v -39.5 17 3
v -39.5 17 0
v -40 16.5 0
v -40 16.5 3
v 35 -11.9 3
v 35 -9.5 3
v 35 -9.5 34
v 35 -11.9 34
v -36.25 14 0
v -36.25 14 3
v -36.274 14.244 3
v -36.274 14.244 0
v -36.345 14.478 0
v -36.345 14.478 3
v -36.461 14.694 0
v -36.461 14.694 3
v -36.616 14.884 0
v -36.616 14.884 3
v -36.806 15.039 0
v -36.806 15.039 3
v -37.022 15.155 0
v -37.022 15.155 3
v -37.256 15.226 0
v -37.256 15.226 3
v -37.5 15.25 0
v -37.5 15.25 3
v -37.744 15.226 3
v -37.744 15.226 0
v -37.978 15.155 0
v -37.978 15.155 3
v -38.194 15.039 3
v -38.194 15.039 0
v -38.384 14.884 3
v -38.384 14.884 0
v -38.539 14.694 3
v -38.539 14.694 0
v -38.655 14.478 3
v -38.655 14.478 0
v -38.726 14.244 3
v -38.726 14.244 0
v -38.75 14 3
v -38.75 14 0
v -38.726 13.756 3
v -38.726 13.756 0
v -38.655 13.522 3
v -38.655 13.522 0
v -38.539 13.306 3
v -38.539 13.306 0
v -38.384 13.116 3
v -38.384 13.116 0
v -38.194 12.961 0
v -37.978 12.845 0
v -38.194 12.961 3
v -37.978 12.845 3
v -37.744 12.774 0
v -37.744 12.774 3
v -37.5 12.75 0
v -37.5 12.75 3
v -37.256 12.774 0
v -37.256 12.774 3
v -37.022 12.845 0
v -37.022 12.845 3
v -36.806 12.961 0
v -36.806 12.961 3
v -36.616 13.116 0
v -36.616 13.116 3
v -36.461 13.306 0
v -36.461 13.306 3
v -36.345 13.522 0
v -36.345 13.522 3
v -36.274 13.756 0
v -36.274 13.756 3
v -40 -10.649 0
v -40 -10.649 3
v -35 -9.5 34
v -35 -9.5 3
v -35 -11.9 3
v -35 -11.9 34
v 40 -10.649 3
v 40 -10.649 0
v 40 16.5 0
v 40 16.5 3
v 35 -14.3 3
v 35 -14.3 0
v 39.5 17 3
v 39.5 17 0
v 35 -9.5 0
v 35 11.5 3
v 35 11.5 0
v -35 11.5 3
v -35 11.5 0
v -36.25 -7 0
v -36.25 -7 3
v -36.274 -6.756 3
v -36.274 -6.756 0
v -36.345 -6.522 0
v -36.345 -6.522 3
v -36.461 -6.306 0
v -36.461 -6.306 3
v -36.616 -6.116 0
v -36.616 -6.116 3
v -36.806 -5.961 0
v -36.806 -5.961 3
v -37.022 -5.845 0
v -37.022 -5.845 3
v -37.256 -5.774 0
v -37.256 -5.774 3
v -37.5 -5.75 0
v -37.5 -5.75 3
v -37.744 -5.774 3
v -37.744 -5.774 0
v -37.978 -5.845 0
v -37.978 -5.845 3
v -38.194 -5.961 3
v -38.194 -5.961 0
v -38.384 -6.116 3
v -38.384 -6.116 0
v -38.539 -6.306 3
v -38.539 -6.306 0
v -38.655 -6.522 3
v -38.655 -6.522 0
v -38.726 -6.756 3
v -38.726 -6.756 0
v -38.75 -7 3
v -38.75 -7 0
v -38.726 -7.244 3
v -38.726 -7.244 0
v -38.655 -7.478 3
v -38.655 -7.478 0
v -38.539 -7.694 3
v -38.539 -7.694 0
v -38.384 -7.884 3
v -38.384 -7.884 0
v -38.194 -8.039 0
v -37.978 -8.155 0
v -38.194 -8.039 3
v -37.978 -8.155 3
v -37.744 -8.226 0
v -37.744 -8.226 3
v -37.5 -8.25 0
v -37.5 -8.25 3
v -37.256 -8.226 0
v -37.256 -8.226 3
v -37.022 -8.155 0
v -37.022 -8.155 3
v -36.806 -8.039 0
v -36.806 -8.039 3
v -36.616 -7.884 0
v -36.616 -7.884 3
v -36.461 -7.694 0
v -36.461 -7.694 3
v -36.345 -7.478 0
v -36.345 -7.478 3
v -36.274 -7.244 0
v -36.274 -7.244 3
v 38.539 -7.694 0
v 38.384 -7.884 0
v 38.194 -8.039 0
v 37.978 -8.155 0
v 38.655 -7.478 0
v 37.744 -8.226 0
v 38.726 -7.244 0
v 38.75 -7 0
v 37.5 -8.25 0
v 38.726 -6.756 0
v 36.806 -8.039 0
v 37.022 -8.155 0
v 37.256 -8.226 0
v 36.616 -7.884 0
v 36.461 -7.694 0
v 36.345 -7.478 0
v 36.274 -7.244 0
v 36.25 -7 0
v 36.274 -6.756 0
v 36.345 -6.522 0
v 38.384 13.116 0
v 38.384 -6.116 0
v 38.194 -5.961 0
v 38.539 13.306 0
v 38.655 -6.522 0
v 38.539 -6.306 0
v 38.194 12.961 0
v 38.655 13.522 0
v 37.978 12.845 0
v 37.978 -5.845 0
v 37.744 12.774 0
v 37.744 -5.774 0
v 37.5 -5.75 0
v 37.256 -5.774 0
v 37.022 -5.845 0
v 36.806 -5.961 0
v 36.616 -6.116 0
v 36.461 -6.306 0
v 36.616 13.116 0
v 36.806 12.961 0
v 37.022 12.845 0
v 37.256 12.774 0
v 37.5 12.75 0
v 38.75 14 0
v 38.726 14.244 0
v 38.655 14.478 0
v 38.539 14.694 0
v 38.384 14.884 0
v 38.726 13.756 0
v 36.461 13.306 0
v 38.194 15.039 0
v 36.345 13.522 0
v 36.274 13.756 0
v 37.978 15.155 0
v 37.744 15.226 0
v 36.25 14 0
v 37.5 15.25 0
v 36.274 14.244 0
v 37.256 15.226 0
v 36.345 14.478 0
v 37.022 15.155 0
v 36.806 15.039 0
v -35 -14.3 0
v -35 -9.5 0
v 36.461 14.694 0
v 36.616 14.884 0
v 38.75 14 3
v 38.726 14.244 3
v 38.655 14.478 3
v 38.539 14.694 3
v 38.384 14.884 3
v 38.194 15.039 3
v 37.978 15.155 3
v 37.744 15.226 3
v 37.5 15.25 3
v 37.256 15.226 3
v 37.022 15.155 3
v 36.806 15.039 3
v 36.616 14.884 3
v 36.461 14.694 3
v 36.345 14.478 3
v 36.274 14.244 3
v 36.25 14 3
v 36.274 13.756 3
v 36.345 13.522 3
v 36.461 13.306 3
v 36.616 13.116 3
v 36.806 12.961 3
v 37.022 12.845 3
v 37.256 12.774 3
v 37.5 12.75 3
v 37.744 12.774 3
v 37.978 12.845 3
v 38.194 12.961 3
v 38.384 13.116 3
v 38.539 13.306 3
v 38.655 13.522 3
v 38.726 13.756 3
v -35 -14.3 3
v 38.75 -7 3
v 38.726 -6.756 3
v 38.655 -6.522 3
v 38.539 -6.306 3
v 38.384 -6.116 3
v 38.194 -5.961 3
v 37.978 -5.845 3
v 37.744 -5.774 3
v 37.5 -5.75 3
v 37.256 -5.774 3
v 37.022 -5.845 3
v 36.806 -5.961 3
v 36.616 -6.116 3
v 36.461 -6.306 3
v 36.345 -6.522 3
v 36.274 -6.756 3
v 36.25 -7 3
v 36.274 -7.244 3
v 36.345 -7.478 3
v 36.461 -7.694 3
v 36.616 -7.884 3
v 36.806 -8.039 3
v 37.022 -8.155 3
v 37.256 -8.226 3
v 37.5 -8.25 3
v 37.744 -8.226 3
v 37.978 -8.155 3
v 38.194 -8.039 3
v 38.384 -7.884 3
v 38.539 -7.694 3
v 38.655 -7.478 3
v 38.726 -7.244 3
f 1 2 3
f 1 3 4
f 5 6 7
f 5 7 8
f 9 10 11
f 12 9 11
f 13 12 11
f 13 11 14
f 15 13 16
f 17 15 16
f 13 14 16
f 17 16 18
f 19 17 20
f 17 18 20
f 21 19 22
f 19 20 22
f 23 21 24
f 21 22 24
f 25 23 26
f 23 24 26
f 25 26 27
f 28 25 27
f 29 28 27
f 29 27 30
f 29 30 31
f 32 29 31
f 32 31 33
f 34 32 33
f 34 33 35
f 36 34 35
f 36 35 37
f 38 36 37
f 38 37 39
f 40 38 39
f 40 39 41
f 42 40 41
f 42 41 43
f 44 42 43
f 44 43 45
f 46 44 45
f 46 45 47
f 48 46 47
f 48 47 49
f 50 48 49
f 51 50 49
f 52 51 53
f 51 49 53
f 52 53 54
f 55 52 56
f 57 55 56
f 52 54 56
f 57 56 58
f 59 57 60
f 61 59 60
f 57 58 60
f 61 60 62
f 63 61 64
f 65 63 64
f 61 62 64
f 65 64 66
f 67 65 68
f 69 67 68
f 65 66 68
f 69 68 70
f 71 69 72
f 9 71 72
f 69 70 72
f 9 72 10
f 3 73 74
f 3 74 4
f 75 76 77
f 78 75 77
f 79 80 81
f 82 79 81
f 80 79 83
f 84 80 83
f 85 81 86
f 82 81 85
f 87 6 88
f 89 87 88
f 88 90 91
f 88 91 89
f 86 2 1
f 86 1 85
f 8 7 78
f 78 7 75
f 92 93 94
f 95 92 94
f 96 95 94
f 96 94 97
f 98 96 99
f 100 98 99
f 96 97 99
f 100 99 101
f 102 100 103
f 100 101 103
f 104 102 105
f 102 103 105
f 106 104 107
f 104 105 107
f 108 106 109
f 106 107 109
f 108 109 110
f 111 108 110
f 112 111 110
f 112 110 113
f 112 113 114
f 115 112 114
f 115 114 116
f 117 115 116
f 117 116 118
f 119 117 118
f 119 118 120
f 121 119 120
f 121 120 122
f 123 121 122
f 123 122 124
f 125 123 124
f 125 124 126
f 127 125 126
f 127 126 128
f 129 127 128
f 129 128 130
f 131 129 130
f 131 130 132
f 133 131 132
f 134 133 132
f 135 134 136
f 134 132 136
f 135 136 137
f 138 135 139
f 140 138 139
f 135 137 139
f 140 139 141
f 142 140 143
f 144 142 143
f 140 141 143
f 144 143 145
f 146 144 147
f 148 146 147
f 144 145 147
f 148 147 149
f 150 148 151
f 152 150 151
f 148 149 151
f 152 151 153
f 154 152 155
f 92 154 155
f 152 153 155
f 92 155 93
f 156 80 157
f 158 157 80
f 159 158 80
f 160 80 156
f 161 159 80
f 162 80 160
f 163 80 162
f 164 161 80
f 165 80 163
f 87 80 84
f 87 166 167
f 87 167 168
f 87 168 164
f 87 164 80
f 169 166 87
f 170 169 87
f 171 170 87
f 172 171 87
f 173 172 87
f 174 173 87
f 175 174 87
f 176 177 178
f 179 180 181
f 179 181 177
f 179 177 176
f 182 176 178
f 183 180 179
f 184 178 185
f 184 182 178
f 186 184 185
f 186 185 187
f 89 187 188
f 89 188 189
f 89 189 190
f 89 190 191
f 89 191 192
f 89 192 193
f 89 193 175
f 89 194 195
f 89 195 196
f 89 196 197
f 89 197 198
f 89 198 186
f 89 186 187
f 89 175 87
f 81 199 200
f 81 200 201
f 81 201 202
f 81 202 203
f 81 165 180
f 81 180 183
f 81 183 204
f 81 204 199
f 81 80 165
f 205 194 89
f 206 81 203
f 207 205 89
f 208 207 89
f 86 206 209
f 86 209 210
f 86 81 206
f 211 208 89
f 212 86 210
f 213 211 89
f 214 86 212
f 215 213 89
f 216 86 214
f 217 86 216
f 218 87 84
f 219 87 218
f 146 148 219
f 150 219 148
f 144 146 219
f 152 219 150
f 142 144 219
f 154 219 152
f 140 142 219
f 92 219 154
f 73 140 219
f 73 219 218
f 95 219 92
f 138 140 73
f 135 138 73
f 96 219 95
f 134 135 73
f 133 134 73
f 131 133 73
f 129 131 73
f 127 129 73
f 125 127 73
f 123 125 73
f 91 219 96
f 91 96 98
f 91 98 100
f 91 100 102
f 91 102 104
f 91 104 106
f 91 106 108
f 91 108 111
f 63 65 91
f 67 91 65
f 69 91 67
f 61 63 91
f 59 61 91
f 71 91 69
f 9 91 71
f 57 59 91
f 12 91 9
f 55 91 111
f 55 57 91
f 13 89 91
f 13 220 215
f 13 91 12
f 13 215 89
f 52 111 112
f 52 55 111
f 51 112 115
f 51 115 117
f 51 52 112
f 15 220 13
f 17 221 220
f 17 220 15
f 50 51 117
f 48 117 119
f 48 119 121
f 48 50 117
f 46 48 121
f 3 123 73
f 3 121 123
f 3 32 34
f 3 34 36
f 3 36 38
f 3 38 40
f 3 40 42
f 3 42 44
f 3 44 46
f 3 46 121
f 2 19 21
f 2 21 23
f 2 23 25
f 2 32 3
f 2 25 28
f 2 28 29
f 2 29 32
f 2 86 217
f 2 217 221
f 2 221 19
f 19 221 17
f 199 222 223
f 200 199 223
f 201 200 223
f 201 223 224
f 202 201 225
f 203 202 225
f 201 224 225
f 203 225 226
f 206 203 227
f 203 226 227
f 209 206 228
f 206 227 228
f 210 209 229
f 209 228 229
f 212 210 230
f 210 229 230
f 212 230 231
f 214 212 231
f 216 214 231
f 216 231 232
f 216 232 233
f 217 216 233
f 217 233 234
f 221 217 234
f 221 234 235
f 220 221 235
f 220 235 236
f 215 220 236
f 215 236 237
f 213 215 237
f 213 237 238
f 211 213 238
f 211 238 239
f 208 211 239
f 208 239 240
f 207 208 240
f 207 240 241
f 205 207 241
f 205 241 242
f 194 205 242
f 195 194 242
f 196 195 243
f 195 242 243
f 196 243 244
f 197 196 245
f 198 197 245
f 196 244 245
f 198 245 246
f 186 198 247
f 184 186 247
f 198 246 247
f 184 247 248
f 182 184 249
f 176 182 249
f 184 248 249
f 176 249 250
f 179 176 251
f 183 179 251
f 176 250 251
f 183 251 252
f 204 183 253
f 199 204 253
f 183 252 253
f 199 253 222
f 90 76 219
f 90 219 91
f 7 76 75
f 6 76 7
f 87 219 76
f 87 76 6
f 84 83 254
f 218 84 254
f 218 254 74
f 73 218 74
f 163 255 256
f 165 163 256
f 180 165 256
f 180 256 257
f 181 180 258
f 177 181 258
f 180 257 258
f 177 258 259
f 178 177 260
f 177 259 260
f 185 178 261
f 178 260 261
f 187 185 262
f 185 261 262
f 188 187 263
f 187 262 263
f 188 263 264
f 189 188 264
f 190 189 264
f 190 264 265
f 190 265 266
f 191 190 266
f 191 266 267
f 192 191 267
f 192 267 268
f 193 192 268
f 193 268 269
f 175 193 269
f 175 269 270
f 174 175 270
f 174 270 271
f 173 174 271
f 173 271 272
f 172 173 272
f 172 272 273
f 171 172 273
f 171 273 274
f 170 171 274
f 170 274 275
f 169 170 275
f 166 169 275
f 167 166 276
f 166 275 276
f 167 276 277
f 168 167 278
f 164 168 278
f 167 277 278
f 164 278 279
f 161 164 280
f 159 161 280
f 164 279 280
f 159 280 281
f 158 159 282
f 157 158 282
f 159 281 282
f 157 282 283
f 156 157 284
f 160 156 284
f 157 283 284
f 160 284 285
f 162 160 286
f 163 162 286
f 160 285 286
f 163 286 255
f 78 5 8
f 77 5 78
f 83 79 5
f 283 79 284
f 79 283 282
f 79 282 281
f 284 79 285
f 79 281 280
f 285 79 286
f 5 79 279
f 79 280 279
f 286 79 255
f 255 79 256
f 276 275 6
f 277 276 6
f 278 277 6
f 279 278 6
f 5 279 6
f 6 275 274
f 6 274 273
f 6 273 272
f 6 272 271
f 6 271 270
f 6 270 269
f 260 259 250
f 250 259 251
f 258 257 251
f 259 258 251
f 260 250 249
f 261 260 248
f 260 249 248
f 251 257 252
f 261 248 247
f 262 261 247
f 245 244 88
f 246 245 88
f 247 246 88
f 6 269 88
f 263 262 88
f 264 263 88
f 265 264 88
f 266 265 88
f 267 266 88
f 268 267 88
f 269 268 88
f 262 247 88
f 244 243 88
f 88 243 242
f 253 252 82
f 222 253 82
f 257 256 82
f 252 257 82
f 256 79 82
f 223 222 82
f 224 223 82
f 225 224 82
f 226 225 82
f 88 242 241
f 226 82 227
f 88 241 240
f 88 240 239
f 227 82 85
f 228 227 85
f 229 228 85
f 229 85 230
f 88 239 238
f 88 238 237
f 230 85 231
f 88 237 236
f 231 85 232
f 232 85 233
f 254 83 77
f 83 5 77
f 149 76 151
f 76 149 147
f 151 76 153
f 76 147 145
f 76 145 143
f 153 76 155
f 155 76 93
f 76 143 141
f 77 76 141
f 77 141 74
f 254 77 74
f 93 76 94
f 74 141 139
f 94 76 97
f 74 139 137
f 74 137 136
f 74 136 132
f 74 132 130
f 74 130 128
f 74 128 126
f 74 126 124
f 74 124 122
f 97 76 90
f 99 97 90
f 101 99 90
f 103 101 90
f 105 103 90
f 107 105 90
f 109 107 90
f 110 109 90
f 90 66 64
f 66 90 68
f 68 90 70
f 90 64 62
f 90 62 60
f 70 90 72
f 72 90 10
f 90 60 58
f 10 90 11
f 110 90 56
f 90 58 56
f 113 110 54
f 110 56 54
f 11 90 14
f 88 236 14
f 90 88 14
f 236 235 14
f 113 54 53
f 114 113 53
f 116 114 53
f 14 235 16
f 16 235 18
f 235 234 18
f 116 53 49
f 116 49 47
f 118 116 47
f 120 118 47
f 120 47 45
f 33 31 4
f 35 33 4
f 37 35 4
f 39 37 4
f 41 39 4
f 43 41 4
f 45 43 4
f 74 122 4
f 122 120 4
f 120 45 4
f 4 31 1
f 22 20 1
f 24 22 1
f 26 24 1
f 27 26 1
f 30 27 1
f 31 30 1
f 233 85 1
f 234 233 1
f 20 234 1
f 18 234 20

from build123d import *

# Parameters (mm, degrees)
SKETCH_1_W              = 80
SKETCH_1_H              = 34
EXTRUDE_1_DEPTH         = 3
SKETCH_2_W              = 70
SKETCH_2_H              = 23
CUT_EXTRUDE_2_DEPTH     = 3
CHAMFER_1_SIZE          = 0.5
SKETCH_7_W              = 25
SKETCH_7_H              = 3
CUT_EXTRUDE_6_DEPTH     = 3
FILLET_2_R              = 2
CHAMFER_2_SIZE          = 11
CHAMFER_2_SIZE2         = 6.350852961
CHAMFER_3_SIZE          = 11
CHAMFER_3_SIZE2         = 6.350852961
FILLET_3_R              = 2
HOLE_WIZARD_2_5_2_5_1_D = 2.5
SKETCH_11_W             = 69
SKETCH_11_H             = 10.181057749
CUT_EXTRUDE_1_DEPTH     = 10
EXTRUDE_2_DEPTH         = 3
EXTRUDE_4_DEPTH         = 3
EXTRUDE_5_DEPTH         = 31


with BuildPart() as part:
    # 草图1 → Extrude 1 (new body)
    with BuildSketch(Plane.XY):
        Rectangle(SKETCH_1_W, SKETCH_1_H)
    extrude(amount=EXTRUDE_1_DEPTH)

    # 草图2 → 拉伸2 (cut)
    with BuildSketch(Plane.XY.offset(3)):
        Rectangle(SKETCH_2_W, SKETCH_2_H)
    extrude(amount=-CUT_EXTRUDE_2_DEPTH, mode=Mode.SUBTRACT)

    # 倒角1
    chamfer_1_edges = [part.edges().sort_by_distance(p)[0] for p in [
        (-40, 17, 1.5),
        (40, 17, 1.5),
    ]]
    chamfer(chamfer_1_edges, length=CHAMFER_1_SIZE)

    # 草图7 → 拉伸6 (cut)
    with BuildSketch(Plane.XY.offset(3)):
        with Locations((0, -15.5)):
            Rectangle(SKETCH_7_W, SKETCH_7_H)
    extrude(amount=-CUT_EXTRUDE_6_DEPTH, mode=Mode.SUBTRACT)

    # 圆角2
    fillet_2_edges = [part.edges().sort_by_distance(p)[0] for p in [
        (-12.5, -14, 1.5),
        (12.5, -14, 1.5),
    ]]
    fillet(fillet_2_edges, radius=FILLET_2_R)

    # 倒角2
    chamfer_2_edges = [part.edges().sort_by_distance(p)[0] for p in [
        (40, -17, 1.5),
    ]]
    chamfer_2_side = [part.faces().sort_by_distance(p)[0] for p in [
        (26.25, -17, 1.5),
    ]]
    chamfer(chamfer_2_edges, length=CHAMFER_2_SIZE, length2=CHAMFER_2_SIZE2, reference=chamfer_2_side[0])

    # 倒角3
    chamfer_3_edges = [part.edges().sort_by_distance(p)[0] for p in [
        (-40, -17, 1.5),
    ]]
    chamfer_3_side = [part.faces().sort_by_distance(p)[0] for p in [
        (-26.25, -17, 1.5),
    ]]
    chamfer(chamfer_3_edges, length=CHAMFER_3_SIZE, length2=CHAMFER_3_SIZE2, reference=chamfer_3_side[0])

    # 圆角3
    fillet_3_edges = [part.edges().sort_by_distance(p)[0] for p in [
        (12.5, -17, 1.5),
        (-12.5, -17, 1.5),
    ]]
    fillet(fillet_3_edges, radius=FILLET_3_R)

    # Ø2.5 (2.5) 直径孔1 (through all)
    with Locations(Plane(origin=(-37.5, -7, 0), x_dir=(-1, 0, 0), z_dir=(0, 0, -1))):
        with Locations((0, 0), (0, 21), (-75, 21), (-75, 0)):
            Hole(HOLE_WIZARD_2_5_2_5_1_D / 2)

    # 草图11 → 切除-拉伸1 (cut)
    with BuildSketch(Plane.XY.offset(3)):
        with Locations((0, -18.915102393)):
            Rectangle(SKETCH_11_W, SKETCH_11_H)
    extrude(amount=-CUT_EXTRUDE_1_DEPTH, mode=Mode.SUBTRACT)

    # 草图12 → 凸台-拉伸2 (add)
    with BuildSketch(Plane.XY.offset(3)):
        Polygon((-40, -10.649147039), (-34.5, -13.824573519), (34.5, -13.824573519), (40, -10.649147039), (35, -14.3), (-35, -14.3), align=None)
    extrude(amount=-EXTRUDE_2_DEPTH)

    # 草图13 → 凸台-拉伸4 (add)
    with BuildSketch(Plane.XY.offset(3)):
        Polygon((-35, -11.5), (-35, -9.5), (35, -9.5), (35, -11.9), (-35, -11.9), align=None)
    extrude(amount=-EXTRUDE_4_DEPTH)

    # 草图13<2> → 凸台-拉伸5 (add)
    with BuildSketch(Plane.XY.offset(3)):
        Polygon((-35, -11.5), (-35, -9.5), (35, -9.5), (35, -11.9), (-35, -11.9), align=None)
    extrude(amount=EXTRUDE_5_DEPTH)


solid = part.part
